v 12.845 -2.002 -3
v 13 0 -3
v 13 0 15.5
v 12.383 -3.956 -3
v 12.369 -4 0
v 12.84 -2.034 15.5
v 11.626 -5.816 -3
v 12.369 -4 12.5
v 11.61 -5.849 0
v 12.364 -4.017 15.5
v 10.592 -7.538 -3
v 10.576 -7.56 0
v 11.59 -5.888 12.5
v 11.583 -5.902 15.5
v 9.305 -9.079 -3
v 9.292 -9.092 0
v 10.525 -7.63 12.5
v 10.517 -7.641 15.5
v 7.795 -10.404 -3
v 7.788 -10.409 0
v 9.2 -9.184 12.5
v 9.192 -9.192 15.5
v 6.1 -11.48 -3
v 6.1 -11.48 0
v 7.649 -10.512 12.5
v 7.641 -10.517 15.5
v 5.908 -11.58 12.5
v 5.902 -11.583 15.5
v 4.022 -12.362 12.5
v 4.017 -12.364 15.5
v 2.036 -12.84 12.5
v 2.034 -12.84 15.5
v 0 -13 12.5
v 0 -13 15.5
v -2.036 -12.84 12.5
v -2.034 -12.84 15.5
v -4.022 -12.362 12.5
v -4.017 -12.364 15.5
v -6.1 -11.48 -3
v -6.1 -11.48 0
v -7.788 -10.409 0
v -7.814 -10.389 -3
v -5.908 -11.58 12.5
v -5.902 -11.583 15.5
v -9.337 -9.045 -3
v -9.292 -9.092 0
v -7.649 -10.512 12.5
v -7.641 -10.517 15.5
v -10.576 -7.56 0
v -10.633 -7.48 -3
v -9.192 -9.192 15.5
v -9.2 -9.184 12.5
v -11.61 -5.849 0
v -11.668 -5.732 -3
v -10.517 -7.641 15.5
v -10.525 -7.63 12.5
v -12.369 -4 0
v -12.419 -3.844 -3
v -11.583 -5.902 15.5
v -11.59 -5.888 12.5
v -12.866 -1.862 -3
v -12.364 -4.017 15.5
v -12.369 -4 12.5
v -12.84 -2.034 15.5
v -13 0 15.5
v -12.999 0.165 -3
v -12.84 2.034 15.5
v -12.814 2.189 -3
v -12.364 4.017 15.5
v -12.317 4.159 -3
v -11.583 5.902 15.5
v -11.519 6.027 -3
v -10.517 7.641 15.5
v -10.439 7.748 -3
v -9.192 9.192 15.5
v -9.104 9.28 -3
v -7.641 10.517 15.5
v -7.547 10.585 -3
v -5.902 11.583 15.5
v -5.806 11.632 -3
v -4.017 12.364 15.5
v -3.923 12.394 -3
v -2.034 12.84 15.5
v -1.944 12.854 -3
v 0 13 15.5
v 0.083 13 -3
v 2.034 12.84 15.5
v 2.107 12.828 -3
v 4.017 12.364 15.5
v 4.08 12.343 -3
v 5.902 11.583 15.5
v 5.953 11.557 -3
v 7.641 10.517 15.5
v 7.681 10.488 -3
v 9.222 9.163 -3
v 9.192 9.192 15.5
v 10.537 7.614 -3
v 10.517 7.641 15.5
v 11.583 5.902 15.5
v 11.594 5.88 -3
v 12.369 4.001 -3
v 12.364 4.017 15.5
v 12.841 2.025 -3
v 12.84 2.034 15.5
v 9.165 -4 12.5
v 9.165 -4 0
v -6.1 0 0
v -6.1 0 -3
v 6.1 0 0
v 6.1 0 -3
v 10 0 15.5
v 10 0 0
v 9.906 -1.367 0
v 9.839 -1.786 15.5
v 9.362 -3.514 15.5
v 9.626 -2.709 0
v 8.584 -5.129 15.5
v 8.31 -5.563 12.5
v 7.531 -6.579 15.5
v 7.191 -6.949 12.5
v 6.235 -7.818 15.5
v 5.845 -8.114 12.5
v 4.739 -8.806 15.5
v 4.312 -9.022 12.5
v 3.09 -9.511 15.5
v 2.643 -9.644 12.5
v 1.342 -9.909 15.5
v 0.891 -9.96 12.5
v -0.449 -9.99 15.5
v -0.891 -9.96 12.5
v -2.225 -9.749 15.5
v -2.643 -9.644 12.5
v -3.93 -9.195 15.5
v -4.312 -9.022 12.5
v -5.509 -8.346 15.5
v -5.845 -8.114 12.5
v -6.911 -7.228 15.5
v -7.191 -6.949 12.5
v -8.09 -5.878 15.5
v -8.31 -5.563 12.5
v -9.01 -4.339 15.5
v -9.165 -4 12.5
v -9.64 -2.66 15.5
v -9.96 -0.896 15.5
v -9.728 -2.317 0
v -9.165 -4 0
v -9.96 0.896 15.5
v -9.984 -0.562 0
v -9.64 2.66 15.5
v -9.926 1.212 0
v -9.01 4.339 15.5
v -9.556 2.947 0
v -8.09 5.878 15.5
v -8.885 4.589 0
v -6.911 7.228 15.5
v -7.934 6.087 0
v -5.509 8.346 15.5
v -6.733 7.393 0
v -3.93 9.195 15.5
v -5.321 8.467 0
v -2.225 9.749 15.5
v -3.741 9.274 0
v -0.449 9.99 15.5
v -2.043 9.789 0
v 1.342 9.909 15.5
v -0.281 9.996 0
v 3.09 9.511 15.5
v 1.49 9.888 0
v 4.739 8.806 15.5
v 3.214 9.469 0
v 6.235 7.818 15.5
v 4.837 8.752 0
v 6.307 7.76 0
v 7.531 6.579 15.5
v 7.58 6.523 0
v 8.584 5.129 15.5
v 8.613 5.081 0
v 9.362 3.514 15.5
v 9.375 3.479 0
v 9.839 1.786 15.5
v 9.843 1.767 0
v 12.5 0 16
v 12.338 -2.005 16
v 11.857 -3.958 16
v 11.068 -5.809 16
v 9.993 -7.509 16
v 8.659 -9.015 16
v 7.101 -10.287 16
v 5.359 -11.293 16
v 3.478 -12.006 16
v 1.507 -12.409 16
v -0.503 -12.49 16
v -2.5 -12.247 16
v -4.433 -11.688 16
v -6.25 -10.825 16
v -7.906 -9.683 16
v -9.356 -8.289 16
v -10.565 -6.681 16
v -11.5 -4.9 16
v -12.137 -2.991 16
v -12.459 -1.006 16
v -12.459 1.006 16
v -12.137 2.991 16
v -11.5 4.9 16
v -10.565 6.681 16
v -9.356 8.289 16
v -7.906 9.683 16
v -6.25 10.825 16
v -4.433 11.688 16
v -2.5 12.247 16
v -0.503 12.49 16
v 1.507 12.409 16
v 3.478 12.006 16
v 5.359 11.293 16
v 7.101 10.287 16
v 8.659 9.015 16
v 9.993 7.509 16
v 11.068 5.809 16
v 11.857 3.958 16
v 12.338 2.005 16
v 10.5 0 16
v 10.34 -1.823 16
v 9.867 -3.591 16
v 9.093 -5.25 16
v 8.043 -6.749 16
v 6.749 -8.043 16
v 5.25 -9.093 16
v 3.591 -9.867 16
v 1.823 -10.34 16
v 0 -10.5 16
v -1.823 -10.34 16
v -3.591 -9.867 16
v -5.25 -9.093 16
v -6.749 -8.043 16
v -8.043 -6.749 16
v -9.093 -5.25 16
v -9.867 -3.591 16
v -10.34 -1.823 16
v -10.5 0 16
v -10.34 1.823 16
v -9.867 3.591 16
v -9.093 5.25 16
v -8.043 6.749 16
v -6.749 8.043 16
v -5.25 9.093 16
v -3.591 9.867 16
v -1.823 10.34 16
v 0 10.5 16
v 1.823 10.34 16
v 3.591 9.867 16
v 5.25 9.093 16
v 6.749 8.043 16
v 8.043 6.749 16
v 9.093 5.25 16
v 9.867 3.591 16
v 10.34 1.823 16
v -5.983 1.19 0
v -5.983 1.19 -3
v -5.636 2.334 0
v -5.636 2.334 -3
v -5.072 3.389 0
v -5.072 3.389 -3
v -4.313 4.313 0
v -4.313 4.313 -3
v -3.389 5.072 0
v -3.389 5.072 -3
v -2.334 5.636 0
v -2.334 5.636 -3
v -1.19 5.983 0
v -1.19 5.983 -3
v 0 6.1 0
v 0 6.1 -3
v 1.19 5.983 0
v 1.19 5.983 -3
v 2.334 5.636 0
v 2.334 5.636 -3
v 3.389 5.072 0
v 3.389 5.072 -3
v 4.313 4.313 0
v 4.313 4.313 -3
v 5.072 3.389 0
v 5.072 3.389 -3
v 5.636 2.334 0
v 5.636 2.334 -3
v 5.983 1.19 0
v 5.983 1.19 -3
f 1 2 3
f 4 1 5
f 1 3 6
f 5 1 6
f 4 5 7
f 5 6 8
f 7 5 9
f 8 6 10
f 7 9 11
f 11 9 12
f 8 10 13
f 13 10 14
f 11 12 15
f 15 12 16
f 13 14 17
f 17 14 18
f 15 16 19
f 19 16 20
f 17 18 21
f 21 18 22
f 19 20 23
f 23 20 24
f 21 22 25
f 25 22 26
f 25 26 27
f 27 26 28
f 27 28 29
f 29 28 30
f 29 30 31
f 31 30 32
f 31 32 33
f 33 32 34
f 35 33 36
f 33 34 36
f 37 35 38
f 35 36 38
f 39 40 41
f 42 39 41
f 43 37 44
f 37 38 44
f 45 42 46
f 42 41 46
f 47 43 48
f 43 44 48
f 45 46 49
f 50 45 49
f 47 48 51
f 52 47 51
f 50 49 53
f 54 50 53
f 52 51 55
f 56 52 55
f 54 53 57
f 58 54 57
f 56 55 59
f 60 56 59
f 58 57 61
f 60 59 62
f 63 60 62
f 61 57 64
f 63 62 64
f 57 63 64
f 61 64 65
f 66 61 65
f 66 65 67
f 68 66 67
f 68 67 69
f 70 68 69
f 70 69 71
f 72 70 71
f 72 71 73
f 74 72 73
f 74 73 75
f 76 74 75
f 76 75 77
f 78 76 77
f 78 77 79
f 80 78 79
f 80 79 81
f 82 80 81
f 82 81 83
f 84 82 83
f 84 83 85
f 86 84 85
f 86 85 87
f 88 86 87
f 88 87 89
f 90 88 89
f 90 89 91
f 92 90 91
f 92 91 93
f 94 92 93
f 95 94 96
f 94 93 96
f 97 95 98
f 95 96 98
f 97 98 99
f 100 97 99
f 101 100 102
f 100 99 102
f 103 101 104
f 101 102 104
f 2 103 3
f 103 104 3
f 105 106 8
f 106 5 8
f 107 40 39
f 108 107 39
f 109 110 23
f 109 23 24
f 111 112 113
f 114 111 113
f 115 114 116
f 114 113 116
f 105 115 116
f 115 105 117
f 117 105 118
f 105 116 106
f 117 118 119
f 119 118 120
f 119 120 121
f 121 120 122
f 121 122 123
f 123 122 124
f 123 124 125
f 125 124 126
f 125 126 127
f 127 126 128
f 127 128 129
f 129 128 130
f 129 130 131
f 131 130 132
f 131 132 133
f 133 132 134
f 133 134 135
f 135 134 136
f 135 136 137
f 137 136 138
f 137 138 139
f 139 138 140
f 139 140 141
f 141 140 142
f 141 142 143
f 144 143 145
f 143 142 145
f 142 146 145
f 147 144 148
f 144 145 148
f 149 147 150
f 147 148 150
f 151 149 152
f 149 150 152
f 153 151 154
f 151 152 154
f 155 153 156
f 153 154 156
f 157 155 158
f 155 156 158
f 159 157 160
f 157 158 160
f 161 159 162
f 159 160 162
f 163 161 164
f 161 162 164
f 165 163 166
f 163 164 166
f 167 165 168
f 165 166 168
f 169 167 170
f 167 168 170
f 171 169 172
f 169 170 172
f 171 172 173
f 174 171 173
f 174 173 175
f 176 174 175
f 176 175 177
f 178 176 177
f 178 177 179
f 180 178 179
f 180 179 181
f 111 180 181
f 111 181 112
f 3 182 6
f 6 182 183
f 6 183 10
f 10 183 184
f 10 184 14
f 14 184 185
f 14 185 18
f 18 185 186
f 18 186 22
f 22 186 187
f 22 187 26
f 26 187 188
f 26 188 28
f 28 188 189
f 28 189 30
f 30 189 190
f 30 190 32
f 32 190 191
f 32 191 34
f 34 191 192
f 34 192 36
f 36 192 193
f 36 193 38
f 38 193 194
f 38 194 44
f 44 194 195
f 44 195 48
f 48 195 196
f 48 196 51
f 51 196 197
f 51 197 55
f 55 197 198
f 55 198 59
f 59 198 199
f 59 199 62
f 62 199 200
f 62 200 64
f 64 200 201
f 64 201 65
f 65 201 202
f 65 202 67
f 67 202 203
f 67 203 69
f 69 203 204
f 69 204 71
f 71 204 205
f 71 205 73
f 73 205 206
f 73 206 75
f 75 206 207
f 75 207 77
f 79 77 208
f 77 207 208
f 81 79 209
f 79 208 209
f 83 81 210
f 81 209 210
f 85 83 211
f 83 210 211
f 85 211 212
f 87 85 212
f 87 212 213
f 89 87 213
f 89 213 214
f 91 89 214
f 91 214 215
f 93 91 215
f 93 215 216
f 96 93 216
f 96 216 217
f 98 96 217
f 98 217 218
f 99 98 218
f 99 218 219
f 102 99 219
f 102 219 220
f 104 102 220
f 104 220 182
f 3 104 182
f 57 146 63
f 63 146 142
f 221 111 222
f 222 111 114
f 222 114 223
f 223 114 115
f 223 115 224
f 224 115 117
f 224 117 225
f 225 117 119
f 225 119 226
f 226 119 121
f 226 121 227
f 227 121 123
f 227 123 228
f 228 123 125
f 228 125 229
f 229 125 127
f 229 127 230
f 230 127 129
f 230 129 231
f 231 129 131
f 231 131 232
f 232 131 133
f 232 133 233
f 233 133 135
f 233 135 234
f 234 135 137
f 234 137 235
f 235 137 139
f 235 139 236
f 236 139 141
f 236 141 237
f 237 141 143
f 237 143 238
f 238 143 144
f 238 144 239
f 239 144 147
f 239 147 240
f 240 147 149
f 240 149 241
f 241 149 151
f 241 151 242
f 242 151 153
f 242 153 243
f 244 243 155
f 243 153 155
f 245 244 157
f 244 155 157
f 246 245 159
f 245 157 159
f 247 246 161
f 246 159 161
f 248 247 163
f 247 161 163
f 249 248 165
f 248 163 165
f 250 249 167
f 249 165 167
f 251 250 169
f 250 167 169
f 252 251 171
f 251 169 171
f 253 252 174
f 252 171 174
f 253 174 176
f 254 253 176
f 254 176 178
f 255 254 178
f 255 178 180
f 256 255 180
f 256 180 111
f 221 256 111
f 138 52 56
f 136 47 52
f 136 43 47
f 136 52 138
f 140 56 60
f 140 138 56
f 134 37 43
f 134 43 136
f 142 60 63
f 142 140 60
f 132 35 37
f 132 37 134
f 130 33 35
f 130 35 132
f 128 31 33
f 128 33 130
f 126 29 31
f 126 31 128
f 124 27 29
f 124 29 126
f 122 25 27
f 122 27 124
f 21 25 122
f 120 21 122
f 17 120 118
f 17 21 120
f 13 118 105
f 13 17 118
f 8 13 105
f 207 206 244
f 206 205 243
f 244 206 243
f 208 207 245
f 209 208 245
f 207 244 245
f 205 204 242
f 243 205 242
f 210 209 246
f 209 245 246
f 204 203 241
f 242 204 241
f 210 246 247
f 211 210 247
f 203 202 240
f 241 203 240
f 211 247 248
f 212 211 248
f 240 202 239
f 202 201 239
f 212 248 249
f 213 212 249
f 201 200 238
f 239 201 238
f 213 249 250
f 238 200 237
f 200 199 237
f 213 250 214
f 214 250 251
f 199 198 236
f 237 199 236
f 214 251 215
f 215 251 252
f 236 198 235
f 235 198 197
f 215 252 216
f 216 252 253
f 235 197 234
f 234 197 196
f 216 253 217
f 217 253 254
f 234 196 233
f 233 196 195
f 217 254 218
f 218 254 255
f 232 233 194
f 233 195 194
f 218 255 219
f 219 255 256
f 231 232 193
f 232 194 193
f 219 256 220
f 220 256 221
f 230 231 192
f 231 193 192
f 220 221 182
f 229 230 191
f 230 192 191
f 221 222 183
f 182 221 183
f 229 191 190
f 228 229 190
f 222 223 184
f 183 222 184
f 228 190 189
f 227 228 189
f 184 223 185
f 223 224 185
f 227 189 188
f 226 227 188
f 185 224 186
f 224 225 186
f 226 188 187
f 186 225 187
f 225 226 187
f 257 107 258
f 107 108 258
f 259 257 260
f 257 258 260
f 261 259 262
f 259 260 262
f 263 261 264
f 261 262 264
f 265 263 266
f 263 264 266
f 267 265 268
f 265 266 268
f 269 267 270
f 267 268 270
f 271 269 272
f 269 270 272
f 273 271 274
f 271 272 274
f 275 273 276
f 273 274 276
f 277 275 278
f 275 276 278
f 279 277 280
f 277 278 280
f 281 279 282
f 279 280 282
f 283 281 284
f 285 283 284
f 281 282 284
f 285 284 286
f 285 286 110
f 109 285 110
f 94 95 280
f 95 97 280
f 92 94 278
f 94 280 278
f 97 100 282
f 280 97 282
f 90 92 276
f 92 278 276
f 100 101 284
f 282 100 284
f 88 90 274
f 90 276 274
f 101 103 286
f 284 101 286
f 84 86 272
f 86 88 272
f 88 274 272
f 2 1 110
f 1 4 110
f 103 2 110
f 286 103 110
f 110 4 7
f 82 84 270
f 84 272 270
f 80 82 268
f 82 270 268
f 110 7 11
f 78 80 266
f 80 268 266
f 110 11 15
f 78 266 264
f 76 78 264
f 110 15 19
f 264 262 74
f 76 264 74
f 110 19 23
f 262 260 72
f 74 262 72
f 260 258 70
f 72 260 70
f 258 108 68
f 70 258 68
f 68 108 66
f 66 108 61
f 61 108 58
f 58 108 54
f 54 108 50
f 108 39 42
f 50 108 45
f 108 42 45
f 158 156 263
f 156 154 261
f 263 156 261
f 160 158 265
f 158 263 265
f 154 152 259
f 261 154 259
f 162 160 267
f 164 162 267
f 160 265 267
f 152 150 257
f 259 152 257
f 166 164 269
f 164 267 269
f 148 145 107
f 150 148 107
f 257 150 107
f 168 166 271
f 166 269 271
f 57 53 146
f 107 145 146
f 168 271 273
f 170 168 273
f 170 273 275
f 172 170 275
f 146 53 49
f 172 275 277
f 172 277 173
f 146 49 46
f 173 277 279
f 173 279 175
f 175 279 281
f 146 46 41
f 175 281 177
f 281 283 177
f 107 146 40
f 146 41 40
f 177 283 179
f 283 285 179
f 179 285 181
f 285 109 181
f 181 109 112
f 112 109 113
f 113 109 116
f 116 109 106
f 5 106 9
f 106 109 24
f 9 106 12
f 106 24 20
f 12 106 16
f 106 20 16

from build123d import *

# Parameters (mm, degrees)
F2_SIZE  = 0.5
F3_SIZE  = 0.5
F5_DEPTH = 20
F6_W     = 16
F6_H     = 12.5
F7_DEPTH = 15


with BuildPart() as f1:
    # F0 (on Front) → F1 (revolve)
    with BuildSketch(Plane.XZ):
        Polygon((10, 16), (10, 0), (6.1, 0), (6.1, -3), (13, -3), (13, 16), align=None)
    revolve(axis=Axis((0, 0, 6.7583965138), (0, 0, -1)))

    # F2
    f2_edges = [f1.edges().sort_by_distance(p)[0] for p in [
        (-13, 0, 16),
    ]]
    chamfer(f2_edges, length=F2_SIZE)

    # F3
    f3_edges = [f1.edges().sort_by_distance(p)[0] for p in [
        (-10, 0, 16),
    ]]
    chamfer(f3_edges, length=F3_SIZE)

    # F4 (on Front) → F5 (cut)
    with BuildSketch(Plane.XZ):
        Polygon((6.1, 0), (6.1, 5), (0, 5), (-6.1, 5), (-6.1, -5.6750147776), (0, -5.6750147776), (6.1, -5.6750147776), align=None)
    extrude(amount=F5_DEPTH, mode=Mode.SUBTRACT)

    # F6 (on Right) → F7 (cut, symmetric)
    with BuildSketch(Plane.YZ):
        with Locations((-12, 6.25)):
            Rectangle(F6_W, F6_H)
    extrude(amount=F7_DEPTH, both=True, mode=Mode.SUBTRACT)


solid = f1.part
